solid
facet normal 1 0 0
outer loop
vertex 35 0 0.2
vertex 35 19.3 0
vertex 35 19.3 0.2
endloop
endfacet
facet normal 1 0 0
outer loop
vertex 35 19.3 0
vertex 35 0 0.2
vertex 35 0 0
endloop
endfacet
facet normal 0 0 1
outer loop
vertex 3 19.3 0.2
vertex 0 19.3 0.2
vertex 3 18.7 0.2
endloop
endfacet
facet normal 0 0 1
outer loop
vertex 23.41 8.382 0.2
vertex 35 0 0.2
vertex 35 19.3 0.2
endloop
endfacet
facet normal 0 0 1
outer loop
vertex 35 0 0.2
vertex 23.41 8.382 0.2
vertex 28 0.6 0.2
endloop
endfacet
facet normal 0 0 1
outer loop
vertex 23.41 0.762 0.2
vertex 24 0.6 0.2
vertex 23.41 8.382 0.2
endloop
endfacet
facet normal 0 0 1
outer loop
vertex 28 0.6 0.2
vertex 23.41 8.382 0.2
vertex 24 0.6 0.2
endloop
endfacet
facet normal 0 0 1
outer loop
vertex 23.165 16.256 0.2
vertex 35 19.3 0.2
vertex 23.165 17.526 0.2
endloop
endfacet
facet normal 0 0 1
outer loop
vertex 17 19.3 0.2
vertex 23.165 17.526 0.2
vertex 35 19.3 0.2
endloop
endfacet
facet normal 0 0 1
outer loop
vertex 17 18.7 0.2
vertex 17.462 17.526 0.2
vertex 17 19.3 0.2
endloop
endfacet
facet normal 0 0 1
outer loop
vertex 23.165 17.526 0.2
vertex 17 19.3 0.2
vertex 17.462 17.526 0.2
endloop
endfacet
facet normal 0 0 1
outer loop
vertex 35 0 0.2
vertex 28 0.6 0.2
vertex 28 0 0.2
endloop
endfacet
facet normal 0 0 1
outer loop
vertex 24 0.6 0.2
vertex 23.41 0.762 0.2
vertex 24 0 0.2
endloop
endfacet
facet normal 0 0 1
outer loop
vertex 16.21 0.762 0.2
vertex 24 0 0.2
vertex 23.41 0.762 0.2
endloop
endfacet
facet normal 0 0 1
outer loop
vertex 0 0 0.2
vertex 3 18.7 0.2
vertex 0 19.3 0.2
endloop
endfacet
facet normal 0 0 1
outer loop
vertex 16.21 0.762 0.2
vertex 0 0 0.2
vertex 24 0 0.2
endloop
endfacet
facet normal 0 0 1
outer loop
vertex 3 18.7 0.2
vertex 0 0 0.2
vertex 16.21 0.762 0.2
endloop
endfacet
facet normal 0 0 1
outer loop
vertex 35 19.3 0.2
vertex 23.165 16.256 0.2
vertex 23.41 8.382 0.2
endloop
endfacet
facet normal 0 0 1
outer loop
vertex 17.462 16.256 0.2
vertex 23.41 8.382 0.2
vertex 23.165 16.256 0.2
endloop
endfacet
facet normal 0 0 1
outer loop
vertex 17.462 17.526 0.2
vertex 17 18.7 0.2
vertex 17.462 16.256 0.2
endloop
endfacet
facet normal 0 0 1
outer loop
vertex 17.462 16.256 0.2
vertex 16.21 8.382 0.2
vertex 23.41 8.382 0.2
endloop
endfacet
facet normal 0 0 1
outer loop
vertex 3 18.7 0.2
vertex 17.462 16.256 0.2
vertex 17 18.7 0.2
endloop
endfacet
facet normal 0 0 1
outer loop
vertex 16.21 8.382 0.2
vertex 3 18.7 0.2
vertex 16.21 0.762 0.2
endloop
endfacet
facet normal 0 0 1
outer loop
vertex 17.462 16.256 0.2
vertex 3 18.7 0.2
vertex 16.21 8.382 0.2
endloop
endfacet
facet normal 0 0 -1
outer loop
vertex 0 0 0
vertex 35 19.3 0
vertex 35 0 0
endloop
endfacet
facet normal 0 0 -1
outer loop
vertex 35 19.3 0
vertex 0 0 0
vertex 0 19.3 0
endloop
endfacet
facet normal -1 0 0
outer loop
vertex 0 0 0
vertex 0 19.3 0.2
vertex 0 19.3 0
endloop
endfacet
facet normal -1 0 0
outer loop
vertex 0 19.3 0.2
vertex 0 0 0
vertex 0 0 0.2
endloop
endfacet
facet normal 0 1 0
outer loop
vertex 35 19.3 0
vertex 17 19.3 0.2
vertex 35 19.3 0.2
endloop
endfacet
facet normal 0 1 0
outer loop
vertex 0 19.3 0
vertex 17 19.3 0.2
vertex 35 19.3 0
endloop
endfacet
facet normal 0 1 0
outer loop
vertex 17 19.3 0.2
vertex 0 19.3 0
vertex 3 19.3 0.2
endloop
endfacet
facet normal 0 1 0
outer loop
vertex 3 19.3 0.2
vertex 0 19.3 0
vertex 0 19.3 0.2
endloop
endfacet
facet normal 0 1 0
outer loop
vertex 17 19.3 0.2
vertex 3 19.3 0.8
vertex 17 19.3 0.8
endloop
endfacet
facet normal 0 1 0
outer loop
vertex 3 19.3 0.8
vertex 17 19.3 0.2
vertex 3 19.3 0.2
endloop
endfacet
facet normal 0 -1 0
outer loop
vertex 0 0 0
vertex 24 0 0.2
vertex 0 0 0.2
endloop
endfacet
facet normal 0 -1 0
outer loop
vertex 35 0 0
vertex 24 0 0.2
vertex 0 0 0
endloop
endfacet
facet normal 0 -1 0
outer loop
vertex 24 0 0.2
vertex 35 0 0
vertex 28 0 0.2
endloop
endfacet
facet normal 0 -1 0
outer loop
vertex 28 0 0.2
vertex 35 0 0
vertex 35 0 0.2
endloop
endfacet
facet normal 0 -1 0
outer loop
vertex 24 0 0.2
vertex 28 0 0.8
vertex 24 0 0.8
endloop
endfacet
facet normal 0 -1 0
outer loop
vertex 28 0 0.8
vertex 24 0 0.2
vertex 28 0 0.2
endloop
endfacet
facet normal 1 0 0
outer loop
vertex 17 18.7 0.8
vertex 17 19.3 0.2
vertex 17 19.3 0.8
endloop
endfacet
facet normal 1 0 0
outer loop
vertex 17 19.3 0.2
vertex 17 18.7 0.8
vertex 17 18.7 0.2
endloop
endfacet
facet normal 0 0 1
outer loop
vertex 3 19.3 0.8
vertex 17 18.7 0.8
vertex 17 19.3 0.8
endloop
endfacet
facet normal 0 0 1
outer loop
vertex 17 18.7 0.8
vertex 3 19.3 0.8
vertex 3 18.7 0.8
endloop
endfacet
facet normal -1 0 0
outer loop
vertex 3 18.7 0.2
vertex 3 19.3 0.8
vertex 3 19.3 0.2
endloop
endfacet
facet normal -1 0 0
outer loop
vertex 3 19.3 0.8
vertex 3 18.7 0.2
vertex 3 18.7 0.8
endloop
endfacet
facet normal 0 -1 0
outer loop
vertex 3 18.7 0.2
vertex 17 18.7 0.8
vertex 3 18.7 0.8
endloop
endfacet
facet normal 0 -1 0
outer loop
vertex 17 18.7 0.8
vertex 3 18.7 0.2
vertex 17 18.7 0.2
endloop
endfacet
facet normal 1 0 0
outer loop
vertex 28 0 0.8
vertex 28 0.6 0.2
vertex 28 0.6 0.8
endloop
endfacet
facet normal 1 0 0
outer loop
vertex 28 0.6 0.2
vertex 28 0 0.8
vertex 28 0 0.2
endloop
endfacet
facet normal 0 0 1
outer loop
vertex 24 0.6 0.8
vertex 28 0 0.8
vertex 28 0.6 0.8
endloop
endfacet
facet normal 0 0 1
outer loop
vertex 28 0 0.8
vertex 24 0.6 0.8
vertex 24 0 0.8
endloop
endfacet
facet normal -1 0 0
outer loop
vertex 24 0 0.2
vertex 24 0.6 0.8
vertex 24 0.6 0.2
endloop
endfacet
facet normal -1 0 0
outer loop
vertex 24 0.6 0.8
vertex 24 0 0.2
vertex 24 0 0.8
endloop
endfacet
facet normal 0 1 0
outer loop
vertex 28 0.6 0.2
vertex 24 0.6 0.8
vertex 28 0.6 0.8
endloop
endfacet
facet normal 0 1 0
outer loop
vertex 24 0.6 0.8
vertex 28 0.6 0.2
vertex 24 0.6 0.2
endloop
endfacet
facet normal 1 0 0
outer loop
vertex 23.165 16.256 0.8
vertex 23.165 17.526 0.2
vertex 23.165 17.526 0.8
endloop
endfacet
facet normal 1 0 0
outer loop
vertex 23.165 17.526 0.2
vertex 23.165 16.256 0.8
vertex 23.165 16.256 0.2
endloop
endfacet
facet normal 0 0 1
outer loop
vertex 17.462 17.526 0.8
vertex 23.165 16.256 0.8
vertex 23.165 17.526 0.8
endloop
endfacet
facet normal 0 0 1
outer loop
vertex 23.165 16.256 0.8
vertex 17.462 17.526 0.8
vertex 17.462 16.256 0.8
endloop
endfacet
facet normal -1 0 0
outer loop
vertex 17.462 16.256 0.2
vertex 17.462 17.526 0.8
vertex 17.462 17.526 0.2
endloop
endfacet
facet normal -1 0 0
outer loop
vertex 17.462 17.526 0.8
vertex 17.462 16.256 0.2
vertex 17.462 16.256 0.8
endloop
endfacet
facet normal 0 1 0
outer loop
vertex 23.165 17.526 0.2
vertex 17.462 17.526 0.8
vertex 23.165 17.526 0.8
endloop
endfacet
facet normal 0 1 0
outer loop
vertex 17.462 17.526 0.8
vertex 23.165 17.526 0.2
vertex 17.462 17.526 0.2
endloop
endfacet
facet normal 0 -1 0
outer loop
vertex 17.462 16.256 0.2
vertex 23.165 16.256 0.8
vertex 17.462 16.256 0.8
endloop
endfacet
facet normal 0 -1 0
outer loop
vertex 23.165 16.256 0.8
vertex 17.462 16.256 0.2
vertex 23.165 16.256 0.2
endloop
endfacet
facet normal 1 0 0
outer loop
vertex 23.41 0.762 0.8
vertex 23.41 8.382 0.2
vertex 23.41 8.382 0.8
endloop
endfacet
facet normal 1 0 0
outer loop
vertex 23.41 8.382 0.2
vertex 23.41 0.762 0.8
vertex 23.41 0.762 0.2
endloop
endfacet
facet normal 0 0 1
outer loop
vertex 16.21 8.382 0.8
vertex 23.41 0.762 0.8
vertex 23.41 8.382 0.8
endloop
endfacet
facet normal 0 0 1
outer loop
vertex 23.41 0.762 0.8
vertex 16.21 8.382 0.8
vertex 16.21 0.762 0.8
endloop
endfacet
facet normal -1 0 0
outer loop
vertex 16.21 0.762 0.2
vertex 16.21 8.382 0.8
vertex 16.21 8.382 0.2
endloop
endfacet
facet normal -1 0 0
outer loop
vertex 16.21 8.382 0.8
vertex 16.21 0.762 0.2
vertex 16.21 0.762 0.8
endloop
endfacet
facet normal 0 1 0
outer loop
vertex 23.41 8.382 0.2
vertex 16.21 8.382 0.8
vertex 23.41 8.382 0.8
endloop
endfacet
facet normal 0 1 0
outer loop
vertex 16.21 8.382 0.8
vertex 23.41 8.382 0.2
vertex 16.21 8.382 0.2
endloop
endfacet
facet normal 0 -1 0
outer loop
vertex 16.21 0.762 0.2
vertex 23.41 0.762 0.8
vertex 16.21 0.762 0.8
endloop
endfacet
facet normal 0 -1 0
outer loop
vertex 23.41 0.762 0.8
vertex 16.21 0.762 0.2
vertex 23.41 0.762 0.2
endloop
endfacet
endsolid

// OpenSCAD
// EAGLE-source placement overlay. Review regions only; no retaining mechanism is released.
// Units: mm. Board XY follows source EAGLE datum (0,0) .. (35,19.3).
board_xy=[35,19.3];
board_visual_thickness=0.2; // visualization only; actual PCB thickness not sourced
lip_depth=0.6;
$fn=32;

color([0.35,0.38,0.42,0.45]) cube([board_xy[0],board_xy[1],board_visual_thickness]);
// Source-clear top edge segment: x=3..17, y=18.7..19.3.
color([0.15,0.72,0.25,0.8]) translate([3,18.7,board_visual_thickness]) cube([14,lip_depth,0.6]);
// Source-clear short bottom edge segment: x=24..28, y=0..0.6.
color([0.15,0.72,0.25,0.8]) translate([24,0,board_visual_thickness]) cube([4,lip_depth,0.6]);
// tPlace proxy silhouettes for the two nearest components are visual orientation aids only.
color([0.9,0.2,0.12,0.6]) translate([17.462,16.256,board_visual_thickness]) cube([5.703,1.27,0.6]); // D4/R4 region
color([0.9,0.2,0.12,0.6]) translate([16.21,0.762,board_visual_thickness]) cube([7.2,7.62,0.6]); // SW2 region
